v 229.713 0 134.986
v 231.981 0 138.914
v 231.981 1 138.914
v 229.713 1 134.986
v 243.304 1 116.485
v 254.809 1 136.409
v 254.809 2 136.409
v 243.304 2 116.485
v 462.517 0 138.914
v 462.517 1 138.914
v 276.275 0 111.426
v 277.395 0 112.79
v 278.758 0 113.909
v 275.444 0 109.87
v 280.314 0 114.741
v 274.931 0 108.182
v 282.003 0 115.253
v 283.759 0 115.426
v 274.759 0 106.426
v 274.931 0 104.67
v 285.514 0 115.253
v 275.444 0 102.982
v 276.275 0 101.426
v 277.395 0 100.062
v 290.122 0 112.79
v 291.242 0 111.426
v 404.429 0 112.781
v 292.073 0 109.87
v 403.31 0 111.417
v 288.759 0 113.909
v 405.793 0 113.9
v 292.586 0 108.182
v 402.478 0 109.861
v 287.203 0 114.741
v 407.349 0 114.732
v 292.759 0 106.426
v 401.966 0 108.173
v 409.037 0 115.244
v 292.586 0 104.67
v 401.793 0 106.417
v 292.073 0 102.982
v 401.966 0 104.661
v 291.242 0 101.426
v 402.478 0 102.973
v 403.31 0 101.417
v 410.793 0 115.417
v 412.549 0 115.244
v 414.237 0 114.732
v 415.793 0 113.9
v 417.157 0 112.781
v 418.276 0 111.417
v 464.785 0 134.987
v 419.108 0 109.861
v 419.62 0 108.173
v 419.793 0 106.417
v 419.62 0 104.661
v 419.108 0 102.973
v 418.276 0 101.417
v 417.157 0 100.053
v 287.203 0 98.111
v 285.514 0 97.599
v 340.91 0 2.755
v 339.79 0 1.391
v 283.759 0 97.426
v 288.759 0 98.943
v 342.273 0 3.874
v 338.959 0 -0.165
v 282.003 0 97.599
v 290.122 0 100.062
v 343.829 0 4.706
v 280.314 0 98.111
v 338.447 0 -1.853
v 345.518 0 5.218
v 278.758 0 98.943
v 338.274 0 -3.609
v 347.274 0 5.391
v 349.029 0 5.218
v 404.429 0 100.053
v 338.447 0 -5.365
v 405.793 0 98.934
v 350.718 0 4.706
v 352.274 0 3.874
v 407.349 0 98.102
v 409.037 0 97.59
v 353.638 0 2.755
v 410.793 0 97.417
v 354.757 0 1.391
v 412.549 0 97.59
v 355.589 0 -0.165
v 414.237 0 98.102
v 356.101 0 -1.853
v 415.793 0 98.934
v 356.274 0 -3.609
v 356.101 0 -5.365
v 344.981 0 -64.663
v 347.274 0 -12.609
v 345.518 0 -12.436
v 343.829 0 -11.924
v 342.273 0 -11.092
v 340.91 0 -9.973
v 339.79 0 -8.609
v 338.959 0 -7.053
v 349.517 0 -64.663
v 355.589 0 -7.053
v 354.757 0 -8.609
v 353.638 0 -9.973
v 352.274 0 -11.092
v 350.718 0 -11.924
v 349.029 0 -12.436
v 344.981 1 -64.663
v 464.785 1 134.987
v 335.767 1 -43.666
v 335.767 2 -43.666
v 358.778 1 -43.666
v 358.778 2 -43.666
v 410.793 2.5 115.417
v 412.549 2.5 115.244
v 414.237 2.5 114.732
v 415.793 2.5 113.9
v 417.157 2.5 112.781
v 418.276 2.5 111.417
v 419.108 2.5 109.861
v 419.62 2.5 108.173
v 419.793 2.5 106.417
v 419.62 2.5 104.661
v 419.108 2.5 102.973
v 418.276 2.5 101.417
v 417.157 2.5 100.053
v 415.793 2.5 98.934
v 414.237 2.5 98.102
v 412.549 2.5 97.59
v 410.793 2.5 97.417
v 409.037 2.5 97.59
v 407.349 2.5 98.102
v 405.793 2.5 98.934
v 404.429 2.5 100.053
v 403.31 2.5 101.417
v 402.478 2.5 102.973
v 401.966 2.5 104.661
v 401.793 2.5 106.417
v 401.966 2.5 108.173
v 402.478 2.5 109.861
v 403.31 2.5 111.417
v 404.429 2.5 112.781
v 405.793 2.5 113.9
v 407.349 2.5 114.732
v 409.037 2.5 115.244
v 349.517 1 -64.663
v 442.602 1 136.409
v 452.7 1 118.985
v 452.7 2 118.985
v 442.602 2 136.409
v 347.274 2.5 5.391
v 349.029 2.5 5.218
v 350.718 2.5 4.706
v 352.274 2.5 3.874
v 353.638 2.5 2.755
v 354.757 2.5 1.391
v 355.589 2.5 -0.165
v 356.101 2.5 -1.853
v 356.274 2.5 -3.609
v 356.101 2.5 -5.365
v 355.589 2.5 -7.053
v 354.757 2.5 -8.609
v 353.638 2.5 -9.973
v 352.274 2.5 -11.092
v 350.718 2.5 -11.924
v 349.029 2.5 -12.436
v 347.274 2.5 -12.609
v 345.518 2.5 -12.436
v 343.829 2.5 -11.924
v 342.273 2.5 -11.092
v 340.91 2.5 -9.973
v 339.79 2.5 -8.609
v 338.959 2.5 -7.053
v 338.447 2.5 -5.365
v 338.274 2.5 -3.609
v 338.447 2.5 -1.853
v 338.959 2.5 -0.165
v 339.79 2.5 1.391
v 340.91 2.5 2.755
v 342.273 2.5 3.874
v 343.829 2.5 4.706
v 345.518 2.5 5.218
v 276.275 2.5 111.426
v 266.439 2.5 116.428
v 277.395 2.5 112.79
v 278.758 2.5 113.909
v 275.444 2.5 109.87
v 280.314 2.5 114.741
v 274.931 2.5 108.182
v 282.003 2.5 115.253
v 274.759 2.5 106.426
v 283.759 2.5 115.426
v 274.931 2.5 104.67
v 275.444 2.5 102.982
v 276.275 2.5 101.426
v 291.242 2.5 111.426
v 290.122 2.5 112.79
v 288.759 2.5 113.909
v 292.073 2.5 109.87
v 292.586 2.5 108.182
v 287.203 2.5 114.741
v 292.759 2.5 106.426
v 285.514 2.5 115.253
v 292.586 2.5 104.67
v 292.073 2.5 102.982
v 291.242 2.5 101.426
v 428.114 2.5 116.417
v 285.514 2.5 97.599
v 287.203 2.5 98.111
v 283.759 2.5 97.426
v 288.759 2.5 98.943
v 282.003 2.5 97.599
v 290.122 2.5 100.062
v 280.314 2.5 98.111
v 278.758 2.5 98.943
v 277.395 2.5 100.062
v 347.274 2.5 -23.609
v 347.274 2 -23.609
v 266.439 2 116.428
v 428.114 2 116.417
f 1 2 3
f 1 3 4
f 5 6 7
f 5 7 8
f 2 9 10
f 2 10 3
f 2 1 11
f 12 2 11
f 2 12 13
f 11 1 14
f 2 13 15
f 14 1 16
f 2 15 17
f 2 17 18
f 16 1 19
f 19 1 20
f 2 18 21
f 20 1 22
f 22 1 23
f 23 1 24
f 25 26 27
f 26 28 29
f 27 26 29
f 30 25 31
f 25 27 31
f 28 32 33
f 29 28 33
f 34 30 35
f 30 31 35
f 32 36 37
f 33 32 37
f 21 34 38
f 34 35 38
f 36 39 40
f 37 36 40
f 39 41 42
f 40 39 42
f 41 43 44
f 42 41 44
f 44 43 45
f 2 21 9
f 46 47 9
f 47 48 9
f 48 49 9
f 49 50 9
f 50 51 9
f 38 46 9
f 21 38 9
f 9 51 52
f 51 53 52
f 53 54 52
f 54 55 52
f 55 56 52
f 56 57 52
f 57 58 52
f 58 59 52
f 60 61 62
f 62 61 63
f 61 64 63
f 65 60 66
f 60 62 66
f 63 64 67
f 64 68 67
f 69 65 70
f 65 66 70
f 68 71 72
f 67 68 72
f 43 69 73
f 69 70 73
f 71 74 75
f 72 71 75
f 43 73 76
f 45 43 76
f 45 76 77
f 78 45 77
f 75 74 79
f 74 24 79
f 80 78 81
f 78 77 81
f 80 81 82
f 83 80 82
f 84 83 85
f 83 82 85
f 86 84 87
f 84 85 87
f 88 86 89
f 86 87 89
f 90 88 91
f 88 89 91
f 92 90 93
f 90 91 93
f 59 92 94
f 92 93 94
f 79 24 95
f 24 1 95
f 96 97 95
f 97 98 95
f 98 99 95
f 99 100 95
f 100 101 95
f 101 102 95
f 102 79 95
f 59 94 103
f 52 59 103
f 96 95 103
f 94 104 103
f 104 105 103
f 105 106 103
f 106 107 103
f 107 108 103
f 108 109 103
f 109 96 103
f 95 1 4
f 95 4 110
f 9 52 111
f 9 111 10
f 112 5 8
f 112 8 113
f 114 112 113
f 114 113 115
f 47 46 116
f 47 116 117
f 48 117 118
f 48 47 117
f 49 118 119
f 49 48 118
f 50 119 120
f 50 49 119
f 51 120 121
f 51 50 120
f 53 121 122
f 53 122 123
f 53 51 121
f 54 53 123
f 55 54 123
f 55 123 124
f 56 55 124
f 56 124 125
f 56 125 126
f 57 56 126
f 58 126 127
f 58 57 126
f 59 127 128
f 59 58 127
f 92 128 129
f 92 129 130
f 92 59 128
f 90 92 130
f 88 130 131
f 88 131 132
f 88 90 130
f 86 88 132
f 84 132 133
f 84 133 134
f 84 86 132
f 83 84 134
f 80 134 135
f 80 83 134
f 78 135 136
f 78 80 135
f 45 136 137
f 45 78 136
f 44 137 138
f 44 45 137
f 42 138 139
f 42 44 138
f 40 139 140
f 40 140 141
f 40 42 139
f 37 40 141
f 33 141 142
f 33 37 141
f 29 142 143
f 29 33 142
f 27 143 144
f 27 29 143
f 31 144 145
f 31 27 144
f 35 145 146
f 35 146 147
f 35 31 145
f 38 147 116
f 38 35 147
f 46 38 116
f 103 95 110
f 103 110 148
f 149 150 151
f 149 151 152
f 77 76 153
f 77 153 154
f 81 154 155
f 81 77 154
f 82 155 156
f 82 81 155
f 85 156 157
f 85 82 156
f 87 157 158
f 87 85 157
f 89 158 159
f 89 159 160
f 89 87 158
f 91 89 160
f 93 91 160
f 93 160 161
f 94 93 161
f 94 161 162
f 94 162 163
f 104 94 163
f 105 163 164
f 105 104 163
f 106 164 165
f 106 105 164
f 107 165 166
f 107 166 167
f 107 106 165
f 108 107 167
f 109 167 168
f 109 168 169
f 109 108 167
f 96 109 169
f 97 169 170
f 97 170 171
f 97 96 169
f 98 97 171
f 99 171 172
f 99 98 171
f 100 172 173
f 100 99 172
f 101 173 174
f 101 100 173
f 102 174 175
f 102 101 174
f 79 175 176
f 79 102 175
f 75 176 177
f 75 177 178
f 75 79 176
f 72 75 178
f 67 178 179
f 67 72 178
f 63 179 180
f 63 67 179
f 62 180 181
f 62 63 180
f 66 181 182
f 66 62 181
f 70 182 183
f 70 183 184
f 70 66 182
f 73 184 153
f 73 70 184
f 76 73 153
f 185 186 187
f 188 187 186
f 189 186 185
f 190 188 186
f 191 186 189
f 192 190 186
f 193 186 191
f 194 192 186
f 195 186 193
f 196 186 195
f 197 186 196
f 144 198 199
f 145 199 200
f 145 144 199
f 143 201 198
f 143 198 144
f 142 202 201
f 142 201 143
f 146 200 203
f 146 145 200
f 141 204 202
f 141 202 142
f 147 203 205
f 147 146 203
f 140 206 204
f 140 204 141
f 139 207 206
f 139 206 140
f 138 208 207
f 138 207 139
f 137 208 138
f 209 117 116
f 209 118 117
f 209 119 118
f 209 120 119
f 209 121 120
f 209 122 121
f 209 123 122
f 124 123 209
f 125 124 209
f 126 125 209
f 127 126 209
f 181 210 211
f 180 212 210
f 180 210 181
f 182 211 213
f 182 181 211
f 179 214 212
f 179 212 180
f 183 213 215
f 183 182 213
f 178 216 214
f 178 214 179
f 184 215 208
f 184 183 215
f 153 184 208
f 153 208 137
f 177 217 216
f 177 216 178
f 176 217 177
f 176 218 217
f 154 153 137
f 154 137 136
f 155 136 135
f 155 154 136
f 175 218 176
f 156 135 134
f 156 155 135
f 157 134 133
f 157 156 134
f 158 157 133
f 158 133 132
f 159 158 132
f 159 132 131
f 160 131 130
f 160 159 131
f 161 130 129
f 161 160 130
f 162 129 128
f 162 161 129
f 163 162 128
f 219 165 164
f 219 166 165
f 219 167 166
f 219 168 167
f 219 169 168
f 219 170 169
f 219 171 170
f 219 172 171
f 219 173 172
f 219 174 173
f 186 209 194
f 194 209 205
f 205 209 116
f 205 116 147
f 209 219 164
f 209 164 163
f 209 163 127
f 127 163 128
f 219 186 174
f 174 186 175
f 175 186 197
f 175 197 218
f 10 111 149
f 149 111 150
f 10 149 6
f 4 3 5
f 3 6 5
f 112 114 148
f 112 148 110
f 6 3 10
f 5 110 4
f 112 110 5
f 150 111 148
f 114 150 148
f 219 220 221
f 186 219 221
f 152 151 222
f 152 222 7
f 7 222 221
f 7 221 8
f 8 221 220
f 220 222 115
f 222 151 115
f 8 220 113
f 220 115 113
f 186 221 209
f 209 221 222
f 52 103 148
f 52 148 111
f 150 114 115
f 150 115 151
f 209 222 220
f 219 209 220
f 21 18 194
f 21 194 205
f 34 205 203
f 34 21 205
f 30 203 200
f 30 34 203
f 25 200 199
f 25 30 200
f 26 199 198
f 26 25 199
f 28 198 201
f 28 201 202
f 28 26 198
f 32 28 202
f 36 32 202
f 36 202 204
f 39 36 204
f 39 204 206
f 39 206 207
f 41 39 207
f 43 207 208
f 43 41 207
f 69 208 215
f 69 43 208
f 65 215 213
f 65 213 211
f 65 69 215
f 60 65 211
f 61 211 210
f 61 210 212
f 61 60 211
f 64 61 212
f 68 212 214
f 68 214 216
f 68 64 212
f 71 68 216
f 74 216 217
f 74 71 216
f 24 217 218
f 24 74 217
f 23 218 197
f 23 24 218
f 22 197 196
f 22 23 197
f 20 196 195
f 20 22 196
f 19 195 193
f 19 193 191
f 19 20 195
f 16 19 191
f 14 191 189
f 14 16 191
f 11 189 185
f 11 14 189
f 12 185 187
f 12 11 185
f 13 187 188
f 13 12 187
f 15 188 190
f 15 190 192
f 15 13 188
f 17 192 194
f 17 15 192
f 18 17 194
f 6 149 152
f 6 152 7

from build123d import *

# Parameters (mm, degrees)
BOSS_EXTRUDE1_DEPTH = 1
BOSS_EXTRUDE2_DEPTH = 2
SKETCH1_13_R        = 9
BOSS_EXTRUDE3_DEPTH = 2.5


with BuildPart() as part:
    # Sketch1 → Boss-Extrude1 (new body)
    with BuildSketch(Plane(origin=(0, 0, 0), x_dir=(1, 0, 0), z_dir=(0, 1, 0))):
        Polygon((229.712705007, -134.986323544), (231.981171214, -138.914415757), (462.517056767, -138.914415757), (464.784783451, -134.986661544), (349.516789508, 64.663360453), (344.980692969, 64.663360453), align=None)
        Polygon((254.809280576, -136.408896139), (243.304219773, -116.484791866), (335.767496284, 43.666038066), (358.778179035, 43.666038066), (452.699916625, -118.984688015), (442.602090749, -136.409305398), align=None, mode=Mode.SUBTRACT)
    extrude(amount=BOSS_EXTRUDE1_DEPTH)

    # Sketch1<12> → Boss-Extrude2 (add)
    with BuildSketch(Plane(origin=(0, 0, 0), x_dir=(1, 0, 0), z_dir=(0, 1, 0))):
        Polygon((335.767496284, 43.666038066), (243.304219773, -116.484791866), (254.809280576, -136.408896139), (442.602090749, -136.409305398), (452.699916625, -118.984688015), (358.778179035, 43.666038066), align=None)
        Polygon((428.113670918, -116.417164681), (266.439108268, -116.428009241), (347.273609729, 23.609230825), align=None, mode=Mode.SUBTRACT)
    extrude(amount=BOSS_EXTRUDE2_DEPTH)

    # Sketch1<13> → Boss-Extrude3 (add)
    with BuildSketch(Plane(origin=(0, 0, 0), x_dir=(1, 0, 0), z_dir=(0, 1, 0))):
        Polygon((347.273609729, 23.609230825), (266.439108268, -116.428009241), (428.113670918, -116.417164681), align=None)
        with Locations((283.758521159, -106.426112565)):
            Circle(SKETCH1_13_R, mode=Mode.SUBTRACT)
        with Locations((410.793152563, -106.417182487)):
            Circle(SKETCH1_13_R, mode=Mode.SUBTRACT)
        with Locations((347.273609729, 3.609230825)):
            Circle(SKETCH1_13_R, mode=Mode.SUBTRACT)
    extrude(amount=BOSS_EXTRUDE3_DEPTH)


solid = part.part
